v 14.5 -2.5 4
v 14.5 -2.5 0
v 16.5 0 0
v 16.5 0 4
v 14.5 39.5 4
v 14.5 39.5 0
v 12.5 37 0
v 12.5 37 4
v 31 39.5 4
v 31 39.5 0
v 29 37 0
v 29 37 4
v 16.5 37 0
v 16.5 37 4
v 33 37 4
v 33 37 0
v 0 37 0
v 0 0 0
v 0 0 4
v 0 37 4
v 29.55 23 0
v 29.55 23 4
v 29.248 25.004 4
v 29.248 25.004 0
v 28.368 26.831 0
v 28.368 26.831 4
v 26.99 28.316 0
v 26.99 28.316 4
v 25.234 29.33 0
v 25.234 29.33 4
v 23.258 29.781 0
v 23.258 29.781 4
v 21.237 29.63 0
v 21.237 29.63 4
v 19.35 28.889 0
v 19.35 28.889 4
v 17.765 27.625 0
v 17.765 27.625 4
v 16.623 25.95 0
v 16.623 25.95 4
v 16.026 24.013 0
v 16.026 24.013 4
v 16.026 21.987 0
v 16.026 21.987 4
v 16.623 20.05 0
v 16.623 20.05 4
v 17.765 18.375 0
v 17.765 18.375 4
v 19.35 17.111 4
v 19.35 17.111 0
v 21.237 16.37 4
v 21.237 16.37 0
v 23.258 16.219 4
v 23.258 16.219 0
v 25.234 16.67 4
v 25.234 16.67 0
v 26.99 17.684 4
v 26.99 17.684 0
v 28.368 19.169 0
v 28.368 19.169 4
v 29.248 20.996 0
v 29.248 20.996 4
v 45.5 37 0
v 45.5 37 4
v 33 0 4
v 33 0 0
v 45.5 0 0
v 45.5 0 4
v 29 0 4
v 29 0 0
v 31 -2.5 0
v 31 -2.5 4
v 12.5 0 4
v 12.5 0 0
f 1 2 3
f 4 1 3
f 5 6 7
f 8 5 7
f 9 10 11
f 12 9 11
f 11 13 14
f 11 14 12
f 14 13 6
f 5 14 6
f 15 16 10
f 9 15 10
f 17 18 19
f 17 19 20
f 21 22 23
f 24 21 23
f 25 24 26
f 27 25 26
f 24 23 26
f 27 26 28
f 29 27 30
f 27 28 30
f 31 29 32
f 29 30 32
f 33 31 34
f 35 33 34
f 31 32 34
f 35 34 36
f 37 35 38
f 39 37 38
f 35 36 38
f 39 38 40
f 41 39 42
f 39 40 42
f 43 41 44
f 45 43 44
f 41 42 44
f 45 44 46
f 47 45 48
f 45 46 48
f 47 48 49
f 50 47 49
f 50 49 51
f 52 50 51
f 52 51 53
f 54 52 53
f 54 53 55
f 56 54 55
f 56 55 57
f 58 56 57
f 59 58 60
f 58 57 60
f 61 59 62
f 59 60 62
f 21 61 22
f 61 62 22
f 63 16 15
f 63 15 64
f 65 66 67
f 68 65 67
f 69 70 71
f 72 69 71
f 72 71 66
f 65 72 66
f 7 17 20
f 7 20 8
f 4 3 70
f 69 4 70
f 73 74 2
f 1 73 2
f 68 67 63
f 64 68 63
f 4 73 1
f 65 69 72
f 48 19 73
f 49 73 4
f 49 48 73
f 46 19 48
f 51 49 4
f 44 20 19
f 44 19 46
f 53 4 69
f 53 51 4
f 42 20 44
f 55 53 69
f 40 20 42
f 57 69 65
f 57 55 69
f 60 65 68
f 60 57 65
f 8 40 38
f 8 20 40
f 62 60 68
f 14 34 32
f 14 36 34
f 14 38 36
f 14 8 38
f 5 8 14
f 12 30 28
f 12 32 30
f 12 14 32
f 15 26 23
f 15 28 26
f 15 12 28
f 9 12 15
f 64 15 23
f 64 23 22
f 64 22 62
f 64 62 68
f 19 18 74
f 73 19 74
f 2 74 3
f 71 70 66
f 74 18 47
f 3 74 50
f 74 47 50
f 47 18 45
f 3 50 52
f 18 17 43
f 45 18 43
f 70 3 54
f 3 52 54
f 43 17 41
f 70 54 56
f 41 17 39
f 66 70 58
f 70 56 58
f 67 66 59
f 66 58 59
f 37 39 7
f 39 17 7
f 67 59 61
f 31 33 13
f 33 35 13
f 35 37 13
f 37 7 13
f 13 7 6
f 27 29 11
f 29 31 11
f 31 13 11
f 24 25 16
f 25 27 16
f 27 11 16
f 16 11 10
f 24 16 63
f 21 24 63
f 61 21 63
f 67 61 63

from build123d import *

# Parameters (mm, degrees)
SKETCH1_W        = 45.5
SKETCH1_H        = 37
BASIS_DEPTH      = 4
SKETCH2_R        = 6.8
CAMERA_GAT_DEPTH = 4


with BuildPart() as part:
    # Sketch1 → Basis (new body)
    with BuildSketch(Plane.XY):
        with Locations((22.75, 18.5)):
            Rectangle(SKETCH1_W, SKETCH1_H)
        Polygon((14.5, 39.5), (12.5, 37), (16.5, 37), align=None)
        Polygon((31, 39.5), (29, 37), (33, 37), align=None)
        Polygon((16.5, 0), (12.5, 0), (14.5, -2.5), align=None)
        Polygon((33, 0), (29, 0), (31, -2.5), align=None)
    extrude(amount=BASIS_DEPTH)

    # Sketch2 → Camera gat (cut)
    with BuildSketch(Plane.XY.offset(4)):
        with Locations((22.75, 23)):
            Circle(SKETCH2_R)
    extrude(amount=-CAMERA_GAT_DEPTH, mode=Mode.SUBTRACT)


solid = part.part
